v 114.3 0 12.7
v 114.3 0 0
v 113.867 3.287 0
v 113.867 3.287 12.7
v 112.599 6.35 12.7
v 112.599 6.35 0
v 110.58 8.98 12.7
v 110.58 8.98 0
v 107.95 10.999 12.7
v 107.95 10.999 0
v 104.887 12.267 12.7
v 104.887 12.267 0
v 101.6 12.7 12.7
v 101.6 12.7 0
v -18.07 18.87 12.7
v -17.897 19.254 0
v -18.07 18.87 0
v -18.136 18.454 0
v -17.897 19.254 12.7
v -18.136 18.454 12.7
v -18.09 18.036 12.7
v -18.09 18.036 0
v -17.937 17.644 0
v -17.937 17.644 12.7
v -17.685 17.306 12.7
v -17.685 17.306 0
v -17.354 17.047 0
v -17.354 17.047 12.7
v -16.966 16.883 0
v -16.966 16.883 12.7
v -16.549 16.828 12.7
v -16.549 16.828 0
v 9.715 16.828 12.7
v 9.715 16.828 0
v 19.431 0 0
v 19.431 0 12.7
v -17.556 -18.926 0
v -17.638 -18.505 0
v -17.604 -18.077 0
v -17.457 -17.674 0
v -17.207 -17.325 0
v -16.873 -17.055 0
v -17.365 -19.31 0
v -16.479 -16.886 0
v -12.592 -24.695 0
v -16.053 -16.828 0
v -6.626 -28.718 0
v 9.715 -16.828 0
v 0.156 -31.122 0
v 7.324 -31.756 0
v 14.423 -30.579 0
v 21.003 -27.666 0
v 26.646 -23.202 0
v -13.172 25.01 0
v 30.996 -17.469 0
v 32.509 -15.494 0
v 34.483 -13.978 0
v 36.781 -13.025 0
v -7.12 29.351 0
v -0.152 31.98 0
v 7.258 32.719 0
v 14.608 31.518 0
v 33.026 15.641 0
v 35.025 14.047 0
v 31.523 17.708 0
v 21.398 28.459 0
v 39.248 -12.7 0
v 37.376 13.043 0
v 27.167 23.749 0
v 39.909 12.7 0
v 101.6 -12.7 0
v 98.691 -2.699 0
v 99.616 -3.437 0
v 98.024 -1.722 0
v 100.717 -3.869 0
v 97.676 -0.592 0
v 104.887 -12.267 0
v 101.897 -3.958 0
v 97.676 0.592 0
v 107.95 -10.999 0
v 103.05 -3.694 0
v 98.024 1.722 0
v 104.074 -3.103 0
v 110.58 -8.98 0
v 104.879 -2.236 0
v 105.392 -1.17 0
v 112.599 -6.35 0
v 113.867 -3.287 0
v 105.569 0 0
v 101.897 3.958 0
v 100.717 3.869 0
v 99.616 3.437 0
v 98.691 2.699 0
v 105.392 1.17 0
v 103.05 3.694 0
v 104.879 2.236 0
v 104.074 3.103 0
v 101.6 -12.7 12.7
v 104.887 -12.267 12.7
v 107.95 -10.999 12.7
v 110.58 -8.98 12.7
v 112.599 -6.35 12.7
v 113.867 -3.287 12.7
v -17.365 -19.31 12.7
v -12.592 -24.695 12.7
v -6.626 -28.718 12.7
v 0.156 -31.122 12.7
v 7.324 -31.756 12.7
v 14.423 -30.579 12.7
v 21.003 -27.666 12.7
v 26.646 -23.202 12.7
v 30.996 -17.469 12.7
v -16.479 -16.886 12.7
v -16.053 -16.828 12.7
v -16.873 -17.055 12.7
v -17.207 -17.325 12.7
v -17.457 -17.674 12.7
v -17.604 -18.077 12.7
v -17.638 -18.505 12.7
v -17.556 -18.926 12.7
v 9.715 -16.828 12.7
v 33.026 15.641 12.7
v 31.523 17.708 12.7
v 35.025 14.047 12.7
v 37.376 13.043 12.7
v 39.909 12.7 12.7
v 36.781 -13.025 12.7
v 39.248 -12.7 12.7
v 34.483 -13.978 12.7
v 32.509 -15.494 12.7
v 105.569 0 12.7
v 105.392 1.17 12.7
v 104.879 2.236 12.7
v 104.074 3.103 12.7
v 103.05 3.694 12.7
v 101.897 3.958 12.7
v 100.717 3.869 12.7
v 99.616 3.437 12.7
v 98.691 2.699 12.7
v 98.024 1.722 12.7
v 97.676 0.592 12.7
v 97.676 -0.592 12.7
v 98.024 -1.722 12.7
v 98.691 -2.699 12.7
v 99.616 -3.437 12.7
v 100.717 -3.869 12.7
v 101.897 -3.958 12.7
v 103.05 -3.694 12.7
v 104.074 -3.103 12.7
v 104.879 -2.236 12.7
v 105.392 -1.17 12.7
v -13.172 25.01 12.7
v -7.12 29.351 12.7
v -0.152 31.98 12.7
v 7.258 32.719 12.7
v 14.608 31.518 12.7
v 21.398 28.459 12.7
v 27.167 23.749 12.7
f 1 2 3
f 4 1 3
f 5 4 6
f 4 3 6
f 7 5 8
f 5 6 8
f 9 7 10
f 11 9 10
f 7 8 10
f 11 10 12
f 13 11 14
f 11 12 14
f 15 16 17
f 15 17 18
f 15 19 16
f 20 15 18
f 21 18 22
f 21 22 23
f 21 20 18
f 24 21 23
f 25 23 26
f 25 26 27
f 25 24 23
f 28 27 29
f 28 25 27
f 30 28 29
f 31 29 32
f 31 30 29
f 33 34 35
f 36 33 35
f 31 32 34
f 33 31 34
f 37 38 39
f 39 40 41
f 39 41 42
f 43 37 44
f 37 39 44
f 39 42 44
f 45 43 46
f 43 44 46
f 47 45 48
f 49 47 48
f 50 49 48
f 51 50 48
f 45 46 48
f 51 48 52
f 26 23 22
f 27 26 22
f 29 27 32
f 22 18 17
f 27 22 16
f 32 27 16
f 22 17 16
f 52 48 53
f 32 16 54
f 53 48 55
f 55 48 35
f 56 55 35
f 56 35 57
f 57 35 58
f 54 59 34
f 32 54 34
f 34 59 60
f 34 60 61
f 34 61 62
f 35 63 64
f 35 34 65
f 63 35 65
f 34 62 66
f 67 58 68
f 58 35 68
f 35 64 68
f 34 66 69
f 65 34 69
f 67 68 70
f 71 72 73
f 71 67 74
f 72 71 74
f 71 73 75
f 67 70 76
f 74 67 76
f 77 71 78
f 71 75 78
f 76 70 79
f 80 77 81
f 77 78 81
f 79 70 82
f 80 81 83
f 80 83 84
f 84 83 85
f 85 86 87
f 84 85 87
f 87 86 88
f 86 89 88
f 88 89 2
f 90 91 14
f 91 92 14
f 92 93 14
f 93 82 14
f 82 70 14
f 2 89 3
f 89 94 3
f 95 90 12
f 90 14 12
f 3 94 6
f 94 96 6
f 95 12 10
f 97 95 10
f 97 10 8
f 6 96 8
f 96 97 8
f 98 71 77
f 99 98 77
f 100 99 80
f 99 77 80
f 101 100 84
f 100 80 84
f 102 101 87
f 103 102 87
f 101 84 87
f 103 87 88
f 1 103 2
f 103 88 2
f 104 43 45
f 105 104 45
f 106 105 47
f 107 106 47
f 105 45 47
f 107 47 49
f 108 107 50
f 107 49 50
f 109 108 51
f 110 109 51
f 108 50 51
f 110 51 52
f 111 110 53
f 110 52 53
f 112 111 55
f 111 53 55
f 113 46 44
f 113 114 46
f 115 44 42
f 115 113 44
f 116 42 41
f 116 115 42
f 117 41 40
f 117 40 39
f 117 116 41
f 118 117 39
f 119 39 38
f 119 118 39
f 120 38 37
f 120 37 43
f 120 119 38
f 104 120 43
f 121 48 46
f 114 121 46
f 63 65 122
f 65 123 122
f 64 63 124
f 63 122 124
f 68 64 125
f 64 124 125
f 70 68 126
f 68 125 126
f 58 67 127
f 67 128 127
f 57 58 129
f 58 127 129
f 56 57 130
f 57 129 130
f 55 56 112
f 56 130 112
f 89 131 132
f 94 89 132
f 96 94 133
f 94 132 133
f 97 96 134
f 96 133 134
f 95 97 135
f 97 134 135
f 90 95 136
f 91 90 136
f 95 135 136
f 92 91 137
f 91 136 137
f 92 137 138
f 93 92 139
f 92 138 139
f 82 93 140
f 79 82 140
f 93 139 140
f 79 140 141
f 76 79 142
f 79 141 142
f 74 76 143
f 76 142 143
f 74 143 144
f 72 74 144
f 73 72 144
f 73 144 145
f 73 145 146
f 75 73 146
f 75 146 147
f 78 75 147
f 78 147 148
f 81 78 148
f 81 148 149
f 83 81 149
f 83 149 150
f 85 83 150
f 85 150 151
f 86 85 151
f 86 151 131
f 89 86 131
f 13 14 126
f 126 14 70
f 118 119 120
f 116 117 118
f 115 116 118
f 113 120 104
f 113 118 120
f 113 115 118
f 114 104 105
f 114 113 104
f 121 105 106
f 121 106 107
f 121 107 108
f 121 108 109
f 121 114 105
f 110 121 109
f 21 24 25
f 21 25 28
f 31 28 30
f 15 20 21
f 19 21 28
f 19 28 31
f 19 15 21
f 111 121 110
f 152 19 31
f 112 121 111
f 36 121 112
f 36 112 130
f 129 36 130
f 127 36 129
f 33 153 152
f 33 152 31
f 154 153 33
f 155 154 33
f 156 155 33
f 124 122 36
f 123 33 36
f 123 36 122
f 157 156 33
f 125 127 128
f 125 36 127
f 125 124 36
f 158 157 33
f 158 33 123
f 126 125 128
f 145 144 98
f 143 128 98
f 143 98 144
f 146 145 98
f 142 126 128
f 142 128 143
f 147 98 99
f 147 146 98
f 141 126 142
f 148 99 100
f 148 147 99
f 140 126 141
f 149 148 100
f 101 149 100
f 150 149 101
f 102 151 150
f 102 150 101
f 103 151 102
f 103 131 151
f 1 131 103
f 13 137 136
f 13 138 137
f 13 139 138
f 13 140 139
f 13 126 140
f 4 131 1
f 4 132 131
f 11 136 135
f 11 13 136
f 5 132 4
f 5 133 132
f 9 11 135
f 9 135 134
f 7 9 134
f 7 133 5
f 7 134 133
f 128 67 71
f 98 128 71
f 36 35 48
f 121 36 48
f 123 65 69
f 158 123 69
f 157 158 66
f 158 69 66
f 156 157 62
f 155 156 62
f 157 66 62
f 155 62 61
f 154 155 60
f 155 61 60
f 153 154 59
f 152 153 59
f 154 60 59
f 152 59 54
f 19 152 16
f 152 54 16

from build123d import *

# Parameters (mm, degrees)
F1_DEPTH = 12.7
F2_R     = 3.96875
F3_DEPTH = 12.701
F4_R     = 9.525
F5_R     = 1.5875


with BuildPart() as f1:
    # F0 (on Top) → F1 (new body)
    with BuildSketch(Plane.XY):
        with BuildLine():
            Line((-19.247415, 16.8275), (-9.715362, 16.8275))
            Line((-9.715362, 16.8275), (9.715362, 16.8275))
            Line((9.715362, 16.8275), (19.430723, 0))
            Line((19.430723, 0), (9.715362, -16.8275))
            Line((9.715362, -16.8275), (-9.715362, -16.8275))
            Line((-9.715362, -16.8275), (-18.879693, -16.8275))
            ThreePointArc((-18.879693, -16.8275), (8.495577, -31.687447), (33.187688, -12.7))
            Line((33.187688, -12.7), (101.6, -12.7))
            ThreePointArc((101.6, -12.7), (88.9, 0), (101.6, 12.7))
            Line((101.6, 12.7), (33.63367, 12.7))
            ThreePointArc((33.63367, 12.7), (8.588902, 32.646256), (-19.247415, 16.8275))
        make_face()
        with BuildLine():
            ThreePointArc((114.3, 0), (110.580256, 8.980256), (101.6, 12.7))
            ThreePointArc((101.6, 12.7), (88.9, 0), (101.6, -12.7))
            ThreePointArc((101.6, -12.7), (110.580256, -8.980256), (114.3, 0))
        make_face()
    extrude(amount=F1_DEPTH)

    # F2 (on face) → F3 (cut, through all)
    with BuildSketch(Plane.XY.offset(12.7)):
        with Locations((101.6, 0)):
            Circle(F2_R)
    extrude(amount=-F3_DEPTH, mode=Mode.SUBTRACT)

    # F4
    f4_edges = [f1.edges().sort_by_distance(p)[0] for p in [
        (33.63367, 12.7, 6.35),
        (33.187688, -12.7, 6.35),
    ]]
    fillet(f4_edges, radius=F4_R)

    # F5
    f5_edges = [f1.edges().sort_by_distance(p)[0] for p in [
        (-19.247415, 16.8275, 6.35),
        (-18.879693, -16.8275, 6.35),
    ]]
    fillet(f5_edges, radius=F5_R)


solid = f1.part
